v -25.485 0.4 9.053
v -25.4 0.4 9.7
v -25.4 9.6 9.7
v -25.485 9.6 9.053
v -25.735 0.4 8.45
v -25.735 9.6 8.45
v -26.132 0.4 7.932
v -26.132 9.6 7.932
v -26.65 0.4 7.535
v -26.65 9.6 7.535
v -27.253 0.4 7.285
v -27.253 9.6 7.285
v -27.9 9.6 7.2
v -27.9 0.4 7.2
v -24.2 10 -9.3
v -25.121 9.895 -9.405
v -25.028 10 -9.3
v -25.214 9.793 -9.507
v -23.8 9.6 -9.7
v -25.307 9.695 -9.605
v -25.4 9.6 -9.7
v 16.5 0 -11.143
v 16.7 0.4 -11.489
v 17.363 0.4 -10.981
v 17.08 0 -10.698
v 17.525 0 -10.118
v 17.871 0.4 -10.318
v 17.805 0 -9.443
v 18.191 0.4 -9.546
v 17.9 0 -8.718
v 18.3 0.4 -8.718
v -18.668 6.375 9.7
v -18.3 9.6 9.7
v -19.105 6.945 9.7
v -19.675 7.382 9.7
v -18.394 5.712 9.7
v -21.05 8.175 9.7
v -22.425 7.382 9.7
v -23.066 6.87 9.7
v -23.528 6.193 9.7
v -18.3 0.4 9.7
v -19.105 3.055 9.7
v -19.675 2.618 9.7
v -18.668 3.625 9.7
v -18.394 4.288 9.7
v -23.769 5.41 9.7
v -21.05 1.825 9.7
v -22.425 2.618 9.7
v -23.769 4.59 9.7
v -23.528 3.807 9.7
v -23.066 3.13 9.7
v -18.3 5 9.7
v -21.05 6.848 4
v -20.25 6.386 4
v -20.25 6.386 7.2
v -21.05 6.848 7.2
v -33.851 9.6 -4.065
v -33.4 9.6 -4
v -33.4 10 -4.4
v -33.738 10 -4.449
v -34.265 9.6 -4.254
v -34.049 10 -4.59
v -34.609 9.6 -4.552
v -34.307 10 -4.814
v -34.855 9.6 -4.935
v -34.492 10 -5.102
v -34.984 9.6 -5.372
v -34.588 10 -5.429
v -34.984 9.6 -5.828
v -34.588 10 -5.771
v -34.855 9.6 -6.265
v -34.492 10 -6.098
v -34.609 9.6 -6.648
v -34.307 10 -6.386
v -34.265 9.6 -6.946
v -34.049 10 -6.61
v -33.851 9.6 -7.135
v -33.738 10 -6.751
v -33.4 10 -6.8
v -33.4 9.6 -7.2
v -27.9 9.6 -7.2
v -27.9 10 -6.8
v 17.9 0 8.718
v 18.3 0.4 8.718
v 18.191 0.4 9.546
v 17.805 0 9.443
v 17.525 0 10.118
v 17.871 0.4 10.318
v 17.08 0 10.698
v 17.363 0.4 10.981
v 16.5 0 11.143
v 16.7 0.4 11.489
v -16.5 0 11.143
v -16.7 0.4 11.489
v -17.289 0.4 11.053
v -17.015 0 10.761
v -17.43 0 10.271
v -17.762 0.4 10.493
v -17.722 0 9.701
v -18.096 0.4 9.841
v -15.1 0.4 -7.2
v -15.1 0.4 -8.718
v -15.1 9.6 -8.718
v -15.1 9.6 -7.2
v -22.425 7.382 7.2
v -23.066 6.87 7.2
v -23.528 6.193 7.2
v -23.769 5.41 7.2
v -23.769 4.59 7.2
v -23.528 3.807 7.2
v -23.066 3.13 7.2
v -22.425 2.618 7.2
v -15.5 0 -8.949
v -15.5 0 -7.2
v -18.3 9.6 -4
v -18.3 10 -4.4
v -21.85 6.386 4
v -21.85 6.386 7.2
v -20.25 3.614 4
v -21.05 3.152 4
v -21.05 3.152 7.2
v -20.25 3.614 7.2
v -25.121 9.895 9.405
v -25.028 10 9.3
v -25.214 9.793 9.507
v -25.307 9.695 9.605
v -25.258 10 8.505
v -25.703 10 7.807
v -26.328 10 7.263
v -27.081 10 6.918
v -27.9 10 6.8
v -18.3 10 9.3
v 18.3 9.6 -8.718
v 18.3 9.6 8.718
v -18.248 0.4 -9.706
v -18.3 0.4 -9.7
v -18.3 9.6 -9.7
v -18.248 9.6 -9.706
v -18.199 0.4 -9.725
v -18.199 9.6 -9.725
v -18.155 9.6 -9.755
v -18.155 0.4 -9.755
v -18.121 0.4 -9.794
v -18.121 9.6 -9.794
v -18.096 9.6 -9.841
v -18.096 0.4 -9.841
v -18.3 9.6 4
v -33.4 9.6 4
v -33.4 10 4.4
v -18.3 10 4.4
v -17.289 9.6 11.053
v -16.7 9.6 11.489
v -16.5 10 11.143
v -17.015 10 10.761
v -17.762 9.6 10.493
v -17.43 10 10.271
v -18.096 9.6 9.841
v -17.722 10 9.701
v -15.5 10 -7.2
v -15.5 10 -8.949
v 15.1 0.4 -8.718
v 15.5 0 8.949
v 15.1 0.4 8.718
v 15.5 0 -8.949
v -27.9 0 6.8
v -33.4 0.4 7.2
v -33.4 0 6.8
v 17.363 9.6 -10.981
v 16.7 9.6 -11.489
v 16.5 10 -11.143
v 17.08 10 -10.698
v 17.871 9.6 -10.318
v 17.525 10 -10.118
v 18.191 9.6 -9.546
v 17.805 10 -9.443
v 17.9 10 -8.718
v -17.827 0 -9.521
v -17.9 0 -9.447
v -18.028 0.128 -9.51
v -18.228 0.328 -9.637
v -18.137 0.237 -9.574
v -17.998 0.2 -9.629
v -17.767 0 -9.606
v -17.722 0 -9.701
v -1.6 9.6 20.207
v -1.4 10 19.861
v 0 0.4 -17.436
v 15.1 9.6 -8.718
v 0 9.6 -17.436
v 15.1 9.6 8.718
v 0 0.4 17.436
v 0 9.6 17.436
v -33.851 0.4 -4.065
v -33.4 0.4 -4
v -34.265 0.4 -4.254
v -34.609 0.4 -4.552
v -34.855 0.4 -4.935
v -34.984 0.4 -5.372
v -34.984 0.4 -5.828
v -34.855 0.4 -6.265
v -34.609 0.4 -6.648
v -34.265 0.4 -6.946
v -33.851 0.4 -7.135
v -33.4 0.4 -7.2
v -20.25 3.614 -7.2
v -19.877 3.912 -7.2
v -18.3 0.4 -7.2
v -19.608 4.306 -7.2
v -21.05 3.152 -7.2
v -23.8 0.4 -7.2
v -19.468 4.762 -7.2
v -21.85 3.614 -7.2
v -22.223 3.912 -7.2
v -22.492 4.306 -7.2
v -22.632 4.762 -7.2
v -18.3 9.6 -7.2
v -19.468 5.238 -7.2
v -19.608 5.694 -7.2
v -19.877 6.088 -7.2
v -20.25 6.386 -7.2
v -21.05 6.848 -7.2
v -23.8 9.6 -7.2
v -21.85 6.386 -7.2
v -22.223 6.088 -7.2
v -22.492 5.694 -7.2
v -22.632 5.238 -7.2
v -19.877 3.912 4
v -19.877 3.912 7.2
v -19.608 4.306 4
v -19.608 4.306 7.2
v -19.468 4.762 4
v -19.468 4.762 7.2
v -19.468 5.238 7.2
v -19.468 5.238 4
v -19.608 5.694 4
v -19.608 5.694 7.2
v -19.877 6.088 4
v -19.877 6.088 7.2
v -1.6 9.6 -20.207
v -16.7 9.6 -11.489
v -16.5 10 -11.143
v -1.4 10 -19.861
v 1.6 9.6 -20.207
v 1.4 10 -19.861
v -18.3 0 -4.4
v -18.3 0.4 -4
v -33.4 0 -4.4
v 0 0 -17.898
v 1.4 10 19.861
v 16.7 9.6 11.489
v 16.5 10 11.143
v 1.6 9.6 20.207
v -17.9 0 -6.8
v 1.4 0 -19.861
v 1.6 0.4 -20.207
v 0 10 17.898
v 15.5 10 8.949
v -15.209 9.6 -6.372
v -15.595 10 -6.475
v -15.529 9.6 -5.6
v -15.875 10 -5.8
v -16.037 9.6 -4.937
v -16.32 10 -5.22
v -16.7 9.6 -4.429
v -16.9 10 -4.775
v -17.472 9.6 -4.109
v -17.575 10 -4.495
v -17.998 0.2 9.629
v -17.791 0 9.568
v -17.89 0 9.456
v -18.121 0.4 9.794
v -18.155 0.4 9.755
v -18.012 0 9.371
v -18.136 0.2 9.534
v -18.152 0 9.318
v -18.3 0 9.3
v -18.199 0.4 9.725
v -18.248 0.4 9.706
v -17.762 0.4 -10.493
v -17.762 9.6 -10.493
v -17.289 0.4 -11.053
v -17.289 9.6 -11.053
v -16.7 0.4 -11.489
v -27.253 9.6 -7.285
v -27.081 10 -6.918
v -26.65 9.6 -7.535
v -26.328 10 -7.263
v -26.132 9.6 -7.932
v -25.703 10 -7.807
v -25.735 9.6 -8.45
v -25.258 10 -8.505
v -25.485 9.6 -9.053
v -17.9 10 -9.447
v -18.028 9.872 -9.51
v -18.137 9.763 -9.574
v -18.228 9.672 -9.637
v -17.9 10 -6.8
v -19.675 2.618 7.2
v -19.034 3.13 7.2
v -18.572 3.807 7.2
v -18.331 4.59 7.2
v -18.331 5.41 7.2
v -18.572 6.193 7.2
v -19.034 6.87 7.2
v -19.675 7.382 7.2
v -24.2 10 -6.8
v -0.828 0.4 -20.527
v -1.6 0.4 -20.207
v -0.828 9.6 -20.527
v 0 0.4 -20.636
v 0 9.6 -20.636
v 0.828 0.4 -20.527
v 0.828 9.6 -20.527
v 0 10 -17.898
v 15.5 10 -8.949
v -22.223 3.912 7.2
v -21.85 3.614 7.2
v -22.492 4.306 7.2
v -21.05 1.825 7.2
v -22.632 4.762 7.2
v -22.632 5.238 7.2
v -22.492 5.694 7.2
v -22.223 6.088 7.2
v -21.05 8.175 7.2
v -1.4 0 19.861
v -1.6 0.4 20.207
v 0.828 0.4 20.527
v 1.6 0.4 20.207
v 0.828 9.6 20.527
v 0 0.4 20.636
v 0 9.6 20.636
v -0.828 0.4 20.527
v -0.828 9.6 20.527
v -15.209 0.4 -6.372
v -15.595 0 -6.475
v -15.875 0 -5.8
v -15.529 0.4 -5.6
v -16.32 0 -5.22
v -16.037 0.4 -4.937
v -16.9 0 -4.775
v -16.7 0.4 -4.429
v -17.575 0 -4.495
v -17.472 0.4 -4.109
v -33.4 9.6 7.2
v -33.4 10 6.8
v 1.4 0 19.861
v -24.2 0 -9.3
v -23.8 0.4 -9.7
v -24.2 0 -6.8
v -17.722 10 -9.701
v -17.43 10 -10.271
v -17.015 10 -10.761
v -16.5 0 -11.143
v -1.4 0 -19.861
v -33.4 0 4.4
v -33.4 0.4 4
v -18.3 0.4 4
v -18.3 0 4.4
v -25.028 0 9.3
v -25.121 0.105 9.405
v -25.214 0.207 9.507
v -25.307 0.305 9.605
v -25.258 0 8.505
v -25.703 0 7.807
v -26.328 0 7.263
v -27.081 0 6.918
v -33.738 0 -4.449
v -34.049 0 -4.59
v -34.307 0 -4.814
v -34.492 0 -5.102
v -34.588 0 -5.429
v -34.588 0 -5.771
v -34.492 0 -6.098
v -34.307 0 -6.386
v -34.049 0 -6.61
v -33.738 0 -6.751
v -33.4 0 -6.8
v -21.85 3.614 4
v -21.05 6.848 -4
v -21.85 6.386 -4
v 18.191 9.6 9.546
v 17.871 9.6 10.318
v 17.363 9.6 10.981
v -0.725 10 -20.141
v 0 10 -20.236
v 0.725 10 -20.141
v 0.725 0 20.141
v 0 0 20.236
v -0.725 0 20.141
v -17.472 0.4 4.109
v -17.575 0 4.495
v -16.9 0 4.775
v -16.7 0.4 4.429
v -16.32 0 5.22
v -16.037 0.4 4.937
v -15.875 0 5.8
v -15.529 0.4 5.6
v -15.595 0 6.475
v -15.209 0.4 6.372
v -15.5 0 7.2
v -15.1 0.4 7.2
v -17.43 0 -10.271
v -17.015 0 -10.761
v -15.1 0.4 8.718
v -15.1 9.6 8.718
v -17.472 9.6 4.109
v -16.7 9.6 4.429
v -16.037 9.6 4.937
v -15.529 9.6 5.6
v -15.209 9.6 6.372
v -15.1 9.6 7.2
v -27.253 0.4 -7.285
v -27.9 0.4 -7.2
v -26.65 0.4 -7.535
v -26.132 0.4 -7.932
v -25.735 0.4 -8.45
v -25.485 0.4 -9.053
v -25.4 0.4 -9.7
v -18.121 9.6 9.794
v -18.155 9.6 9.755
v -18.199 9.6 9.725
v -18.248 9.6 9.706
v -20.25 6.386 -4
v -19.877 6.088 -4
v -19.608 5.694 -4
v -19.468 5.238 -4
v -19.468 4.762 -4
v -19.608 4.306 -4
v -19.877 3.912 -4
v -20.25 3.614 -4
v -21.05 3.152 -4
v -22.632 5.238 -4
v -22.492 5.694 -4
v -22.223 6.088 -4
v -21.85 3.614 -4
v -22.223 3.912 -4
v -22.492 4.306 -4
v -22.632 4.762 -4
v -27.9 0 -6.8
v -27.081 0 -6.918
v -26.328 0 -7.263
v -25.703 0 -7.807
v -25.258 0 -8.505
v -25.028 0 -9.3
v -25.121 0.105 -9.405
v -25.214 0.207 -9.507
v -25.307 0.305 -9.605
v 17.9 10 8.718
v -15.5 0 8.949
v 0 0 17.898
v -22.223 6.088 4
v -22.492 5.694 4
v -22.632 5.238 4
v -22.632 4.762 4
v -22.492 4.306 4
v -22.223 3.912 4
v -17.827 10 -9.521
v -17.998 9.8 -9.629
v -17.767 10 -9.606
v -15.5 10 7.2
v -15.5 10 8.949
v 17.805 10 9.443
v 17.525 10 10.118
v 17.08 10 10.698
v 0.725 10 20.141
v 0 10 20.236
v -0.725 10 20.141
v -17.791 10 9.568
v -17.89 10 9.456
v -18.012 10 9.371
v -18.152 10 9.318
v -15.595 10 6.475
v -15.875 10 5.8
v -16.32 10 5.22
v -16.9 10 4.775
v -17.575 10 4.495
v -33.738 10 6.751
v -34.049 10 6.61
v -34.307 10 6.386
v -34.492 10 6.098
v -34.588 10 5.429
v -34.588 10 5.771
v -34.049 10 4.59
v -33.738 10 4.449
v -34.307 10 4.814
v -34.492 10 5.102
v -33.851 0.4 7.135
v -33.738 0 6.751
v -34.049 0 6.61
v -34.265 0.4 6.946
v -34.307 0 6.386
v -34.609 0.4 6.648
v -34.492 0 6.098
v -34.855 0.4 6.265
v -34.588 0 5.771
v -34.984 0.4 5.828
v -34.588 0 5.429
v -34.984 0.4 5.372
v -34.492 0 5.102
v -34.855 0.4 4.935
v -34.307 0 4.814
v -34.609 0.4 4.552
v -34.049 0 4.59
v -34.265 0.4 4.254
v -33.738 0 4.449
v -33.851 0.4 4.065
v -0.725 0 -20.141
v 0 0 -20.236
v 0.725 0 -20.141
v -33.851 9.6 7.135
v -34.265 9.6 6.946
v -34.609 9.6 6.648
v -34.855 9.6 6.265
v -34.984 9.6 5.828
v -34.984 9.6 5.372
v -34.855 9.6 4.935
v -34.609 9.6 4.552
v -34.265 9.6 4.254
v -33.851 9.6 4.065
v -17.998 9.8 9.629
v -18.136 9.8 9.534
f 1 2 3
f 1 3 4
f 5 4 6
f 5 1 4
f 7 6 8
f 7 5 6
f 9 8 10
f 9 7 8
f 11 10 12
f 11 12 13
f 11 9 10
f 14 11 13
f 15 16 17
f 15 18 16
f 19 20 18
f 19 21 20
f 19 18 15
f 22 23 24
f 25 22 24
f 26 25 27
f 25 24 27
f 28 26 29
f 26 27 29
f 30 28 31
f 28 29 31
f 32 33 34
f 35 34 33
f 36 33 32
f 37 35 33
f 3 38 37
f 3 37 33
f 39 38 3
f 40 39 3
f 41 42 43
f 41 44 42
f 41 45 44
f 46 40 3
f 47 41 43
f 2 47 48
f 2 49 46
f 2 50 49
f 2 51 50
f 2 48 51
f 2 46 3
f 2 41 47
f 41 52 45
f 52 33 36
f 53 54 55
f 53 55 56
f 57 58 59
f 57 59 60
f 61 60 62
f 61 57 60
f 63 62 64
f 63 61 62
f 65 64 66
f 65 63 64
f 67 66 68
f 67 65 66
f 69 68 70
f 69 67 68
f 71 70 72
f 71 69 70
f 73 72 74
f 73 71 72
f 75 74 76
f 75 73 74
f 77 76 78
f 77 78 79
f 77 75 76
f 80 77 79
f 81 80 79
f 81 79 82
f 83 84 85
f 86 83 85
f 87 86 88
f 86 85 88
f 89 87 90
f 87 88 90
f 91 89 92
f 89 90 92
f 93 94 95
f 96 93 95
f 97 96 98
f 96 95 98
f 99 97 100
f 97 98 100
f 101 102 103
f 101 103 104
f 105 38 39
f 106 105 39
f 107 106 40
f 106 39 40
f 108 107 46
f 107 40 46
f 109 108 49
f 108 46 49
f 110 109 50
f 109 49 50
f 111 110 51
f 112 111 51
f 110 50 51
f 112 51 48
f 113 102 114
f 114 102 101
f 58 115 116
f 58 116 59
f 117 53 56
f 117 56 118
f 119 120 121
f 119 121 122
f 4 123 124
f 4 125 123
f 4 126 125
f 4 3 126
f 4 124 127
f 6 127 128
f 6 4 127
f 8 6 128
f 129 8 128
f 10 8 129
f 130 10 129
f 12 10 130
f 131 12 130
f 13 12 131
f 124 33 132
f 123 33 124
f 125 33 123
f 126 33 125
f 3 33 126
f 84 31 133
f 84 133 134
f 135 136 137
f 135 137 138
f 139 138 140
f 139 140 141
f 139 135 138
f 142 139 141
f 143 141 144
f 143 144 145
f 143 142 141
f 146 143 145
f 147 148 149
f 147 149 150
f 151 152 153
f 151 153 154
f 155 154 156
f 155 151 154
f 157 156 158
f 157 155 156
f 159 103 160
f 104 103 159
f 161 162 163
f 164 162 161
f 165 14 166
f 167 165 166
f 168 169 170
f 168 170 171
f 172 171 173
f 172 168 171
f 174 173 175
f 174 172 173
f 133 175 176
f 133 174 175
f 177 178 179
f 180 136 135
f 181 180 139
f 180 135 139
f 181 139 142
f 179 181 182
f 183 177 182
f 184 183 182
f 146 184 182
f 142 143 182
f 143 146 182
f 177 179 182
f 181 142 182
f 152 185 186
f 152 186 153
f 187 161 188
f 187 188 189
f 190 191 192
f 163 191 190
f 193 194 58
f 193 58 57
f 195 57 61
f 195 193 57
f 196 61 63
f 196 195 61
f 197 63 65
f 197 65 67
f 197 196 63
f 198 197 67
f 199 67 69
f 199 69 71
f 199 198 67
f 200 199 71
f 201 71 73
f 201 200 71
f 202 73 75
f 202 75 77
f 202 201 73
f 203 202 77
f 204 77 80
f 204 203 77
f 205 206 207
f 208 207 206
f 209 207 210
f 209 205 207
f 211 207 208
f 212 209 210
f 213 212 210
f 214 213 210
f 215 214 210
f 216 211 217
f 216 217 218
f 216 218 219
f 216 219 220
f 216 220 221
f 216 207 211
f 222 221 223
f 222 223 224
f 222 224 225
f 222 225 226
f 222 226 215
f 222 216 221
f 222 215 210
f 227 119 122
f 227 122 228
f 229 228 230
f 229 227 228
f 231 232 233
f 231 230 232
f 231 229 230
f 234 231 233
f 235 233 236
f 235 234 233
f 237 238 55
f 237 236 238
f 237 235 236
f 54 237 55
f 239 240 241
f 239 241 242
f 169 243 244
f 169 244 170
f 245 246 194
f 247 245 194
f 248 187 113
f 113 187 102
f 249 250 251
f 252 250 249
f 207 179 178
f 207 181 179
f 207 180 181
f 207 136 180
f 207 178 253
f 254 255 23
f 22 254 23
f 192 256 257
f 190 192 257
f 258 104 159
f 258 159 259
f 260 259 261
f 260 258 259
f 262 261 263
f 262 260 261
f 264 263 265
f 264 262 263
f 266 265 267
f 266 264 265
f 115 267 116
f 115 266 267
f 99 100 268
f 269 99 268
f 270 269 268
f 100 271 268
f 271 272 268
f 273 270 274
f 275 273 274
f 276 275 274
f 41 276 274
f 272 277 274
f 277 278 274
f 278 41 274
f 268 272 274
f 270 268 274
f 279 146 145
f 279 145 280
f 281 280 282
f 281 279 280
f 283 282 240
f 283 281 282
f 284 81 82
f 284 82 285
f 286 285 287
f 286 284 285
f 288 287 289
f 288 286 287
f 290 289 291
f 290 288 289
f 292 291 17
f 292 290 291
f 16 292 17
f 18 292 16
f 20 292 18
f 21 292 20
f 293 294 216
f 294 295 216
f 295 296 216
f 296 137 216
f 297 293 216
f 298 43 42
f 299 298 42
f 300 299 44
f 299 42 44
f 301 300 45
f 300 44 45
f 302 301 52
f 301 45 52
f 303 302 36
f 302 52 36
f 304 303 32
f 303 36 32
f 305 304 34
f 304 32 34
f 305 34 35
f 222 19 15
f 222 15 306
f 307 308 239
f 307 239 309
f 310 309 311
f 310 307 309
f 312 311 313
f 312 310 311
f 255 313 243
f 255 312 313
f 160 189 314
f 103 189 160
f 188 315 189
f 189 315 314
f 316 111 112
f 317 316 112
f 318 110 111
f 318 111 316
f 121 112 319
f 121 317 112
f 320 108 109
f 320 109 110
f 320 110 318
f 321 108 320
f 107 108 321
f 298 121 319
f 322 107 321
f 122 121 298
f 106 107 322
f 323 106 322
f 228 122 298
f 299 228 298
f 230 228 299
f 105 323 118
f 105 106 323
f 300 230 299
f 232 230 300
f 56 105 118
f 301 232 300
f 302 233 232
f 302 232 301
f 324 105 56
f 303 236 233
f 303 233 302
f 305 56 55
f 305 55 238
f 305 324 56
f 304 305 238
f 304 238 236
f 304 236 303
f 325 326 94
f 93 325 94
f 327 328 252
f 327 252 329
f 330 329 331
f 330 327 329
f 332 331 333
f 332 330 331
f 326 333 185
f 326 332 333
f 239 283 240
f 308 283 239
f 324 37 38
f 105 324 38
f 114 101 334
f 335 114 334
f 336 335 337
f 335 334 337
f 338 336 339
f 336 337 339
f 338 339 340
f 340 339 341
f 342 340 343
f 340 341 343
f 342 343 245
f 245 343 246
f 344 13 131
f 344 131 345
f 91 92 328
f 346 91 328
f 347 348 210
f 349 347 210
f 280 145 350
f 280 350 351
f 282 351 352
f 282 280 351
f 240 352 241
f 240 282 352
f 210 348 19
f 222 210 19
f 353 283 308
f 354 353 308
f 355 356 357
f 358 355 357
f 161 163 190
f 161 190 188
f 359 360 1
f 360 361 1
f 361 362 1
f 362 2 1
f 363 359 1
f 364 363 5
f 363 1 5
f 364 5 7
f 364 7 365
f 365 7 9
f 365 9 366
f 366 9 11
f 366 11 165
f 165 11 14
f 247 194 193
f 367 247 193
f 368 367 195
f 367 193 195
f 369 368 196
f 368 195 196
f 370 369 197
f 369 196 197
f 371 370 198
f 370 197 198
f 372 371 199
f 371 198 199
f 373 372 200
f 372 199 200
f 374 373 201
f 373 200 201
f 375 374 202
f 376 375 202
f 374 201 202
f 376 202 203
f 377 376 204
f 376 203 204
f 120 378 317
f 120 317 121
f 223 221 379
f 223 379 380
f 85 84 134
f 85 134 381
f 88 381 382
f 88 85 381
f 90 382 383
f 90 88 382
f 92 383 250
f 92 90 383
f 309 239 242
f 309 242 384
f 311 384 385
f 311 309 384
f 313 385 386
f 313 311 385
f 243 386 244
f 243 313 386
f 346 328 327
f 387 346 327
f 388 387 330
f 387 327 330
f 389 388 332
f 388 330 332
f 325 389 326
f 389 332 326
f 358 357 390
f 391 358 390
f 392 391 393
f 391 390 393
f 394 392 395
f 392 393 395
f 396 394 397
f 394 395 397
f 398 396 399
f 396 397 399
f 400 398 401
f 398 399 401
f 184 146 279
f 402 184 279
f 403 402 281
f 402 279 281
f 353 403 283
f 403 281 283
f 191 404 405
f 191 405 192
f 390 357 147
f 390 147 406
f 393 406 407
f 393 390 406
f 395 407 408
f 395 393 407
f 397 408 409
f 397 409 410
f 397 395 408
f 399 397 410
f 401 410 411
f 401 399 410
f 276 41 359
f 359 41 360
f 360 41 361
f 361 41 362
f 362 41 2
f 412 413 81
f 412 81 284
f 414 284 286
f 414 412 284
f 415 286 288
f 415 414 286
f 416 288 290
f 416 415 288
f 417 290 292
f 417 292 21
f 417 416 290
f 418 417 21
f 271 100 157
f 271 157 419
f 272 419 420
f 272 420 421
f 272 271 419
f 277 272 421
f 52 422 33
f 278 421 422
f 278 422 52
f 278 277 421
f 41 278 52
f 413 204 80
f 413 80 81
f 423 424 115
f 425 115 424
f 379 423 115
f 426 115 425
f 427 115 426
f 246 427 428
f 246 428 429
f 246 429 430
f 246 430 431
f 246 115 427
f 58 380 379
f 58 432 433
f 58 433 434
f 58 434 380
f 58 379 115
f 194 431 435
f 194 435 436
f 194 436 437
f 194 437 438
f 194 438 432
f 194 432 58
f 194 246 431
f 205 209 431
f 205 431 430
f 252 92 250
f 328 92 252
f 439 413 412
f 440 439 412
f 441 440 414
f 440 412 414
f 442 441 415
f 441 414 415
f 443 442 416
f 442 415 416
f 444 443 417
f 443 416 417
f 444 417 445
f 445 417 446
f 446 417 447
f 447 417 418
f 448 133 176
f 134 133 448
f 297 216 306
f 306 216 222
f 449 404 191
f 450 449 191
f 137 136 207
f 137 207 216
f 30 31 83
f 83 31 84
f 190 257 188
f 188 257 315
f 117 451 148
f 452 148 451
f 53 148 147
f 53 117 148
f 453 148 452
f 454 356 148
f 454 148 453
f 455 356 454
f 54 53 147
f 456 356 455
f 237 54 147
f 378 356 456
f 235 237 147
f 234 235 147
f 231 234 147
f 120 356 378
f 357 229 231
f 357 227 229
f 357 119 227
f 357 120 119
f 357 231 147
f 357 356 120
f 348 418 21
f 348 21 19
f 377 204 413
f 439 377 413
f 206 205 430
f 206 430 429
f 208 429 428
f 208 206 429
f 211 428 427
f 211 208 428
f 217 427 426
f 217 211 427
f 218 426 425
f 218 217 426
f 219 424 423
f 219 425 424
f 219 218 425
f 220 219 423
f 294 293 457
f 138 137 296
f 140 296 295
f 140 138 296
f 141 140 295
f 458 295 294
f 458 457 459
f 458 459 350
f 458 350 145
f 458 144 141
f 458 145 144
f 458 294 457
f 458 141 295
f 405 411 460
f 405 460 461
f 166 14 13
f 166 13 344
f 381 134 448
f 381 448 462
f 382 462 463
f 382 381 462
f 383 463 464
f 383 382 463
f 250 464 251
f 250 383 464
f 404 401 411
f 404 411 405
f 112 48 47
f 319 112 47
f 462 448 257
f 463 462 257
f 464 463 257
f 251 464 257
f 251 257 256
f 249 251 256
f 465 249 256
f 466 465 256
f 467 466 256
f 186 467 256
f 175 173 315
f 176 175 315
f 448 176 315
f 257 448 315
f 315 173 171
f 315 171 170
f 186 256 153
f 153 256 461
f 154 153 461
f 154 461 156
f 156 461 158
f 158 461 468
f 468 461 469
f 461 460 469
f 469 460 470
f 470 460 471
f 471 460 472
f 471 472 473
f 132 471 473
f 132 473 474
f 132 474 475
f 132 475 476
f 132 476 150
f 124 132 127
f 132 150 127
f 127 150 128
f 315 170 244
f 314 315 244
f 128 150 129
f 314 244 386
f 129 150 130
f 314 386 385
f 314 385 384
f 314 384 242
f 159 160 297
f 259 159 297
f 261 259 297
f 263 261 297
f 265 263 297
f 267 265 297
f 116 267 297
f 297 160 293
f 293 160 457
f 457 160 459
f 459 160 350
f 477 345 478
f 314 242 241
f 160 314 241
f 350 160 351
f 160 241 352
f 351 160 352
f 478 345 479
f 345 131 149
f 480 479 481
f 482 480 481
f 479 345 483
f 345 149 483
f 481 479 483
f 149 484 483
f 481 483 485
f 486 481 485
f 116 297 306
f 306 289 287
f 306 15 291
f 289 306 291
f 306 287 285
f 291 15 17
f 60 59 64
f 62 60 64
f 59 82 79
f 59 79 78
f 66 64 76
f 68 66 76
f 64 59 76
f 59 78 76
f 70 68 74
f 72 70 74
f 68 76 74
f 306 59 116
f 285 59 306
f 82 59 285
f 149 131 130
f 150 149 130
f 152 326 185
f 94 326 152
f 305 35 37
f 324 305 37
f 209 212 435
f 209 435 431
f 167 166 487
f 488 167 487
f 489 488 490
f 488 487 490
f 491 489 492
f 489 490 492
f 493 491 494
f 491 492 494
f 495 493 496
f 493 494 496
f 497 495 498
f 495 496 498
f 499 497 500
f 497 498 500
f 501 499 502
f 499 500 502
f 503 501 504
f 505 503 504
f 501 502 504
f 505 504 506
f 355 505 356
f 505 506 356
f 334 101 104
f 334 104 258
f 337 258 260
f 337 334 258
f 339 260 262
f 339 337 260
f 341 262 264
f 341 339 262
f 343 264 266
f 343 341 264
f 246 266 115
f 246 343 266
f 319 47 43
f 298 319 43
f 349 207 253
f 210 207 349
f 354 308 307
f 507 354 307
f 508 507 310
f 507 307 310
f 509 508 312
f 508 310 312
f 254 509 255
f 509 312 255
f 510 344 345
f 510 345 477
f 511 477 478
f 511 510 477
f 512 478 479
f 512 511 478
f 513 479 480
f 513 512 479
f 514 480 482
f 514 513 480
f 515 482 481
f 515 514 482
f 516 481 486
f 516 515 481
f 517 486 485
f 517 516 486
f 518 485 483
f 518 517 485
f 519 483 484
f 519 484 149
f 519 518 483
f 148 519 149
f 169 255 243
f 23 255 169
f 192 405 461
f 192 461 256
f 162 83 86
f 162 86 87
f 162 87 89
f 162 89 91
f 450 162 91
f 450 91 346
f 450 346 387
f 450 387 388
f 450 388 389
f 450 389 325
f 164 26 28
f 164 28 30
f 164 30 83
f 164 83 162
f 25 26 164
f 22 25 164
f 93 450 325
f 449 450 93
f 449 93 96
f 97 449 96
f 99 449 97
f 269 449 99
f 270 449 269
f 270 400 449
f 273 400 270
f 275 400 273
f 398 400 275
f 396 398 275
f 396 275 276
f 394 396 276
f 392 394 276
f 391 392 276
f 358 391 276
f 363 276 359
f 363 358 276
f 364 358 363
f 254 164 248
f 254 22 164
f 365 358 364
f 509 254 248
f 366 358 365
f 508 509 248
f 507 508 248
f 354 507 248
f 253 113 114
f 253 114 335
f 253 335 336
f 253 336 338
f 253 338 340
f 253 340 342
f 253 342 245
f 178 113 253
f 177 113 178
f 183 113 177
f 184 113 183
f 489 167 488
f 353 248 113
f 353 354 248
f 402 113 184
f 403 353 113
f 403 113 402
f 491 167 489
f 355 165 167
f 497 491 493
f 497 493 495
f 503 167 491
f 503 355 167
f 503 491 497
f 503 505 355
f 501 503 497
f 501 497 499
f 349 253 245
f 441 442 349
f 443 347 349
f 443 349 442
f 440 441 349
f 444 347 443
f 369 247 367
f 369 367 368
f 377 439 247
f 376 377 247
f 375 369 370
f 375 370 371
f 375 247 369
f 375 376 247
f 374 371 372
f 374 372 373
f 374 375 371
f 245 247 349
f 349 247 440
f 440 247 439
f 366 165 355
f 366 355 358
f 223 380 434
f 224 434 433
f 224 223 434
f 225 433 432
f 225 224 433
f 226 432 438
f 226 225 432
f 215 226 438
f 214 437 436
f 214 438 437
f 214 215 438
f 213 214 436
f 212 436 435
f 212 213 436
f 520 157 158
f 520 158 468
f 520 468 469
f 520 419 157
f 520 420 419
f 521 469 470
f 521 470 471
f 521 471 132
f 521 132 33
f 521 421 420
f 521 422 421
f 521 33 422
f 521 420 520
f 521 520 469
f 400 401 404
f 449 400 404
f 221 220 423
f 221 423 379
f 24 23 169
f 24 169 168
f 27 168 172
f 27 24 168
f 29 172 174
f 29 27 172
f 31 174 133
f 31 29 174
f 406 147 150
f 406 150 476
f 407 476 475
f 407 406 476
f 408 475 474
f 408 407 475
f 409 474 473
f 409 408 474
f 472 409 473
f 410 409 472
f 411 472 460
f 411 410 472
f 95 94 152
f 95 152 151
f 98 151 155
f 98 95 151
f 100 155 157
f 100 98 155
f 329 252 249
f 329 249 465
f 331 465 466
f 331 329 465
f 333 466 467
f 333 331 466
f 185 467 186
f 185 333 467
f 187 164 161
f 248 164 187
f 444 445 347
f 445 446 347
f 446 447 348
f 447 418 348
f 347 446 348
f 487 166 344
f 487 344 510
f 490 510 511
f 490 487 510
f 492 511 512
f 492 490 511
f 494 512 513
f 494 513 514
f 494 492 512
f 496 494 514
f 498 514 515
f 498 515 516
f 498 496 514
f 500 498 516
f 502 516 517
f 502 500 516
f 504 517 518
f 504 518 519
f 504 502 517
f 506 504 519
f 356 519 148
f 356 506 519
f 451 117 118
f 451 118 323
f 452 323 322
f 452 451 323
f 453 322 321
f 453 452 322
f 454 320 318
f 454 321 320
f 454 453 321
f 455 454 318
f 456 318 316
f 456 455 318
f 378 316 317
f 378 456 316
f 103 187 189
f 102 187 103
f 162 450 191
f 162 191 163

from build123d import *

# Parameters (mm, degrees)
BOSS_EXTRUDE1_DEPTH = 10
SKETCH3_W           = 5.5
SKETCH3_H           = 10
CUT_EXTRUDE1_DEPTH  = 2.5
CUT_EXTRUDE2_DEPTH  = 28.83597813
CUT_EXTRUDE3_DEPTH  = 2.5
CHAMFER1_SIZE       = 0.4


with BuildPart() as part:
    # Sketch1 → Boss-Extrude1 (new body)
    with BuildSketch(Plane(origin=(0, 0, 0), x_dir=(1, 0, 0), z_dir=(0, 1, 0))):
        with BuildLine():
            Line((15.1, -8.717989065), (15.1, 8.717989065))
            Line((15.1, 8.717989065), (0, 17.43597813))
            Line((0, 17.43597813), (-15.1, 8.717989065))
            Line((-15.1, 8.717989065), (-15.1, 7.2))
            ThreePointArc((-15.1, 7.2), (-16.0372583, 4.9372583), (-18.3, 4))
            Line((-18.3, 4), (-33.4, 4))
            ThreePointArc((-33.4, 4), (-35, 5.6), (-33.4, 7.2))
            Line((-33.4, 7.2), (-27.9, 7.2))
            ThreePointArc((-27.9, 7.2), (-26.132233047, 7.932233047), (-25.4, 9.7))
            Line((-25.4, 9.7), (-18.3, 9.7))
            ThreePointArc((-18.3, 9.7), (-18.176160108, 9.73872205), (-18.096437184, 9.841093781))
            ThreePointArc((-18.096437184, 9.841093781), (-17.541501628, 10.786580324), (-16.7, 11.489270357))
            Line((-16.7, 11.489270357), (-1.6, 20.207259422))
            ThreePointArc((-1.6, 20.207259422), (0, 20.63597813), (1.6, 20.207259422))
            Line((1.6, 20.207259422), (16.7, 11.489270357))
            ThreePointArc((16.7, 11.489270357), (17.871281292, 10.317989065), (18.3, 8.717989065))
            Line((18.3, 8.717989065), (18.3, -8.717989065))
            ThreePointArc((18.3, -8.717989065), (17.871281292, -10.317989065), (16.7, -11.489270357))
            Line((16.7, -11.489270357), (1.6, -20.207259422))
            ThreePointArc((1.6, -20.207259422), (0, -20.63597813), (-1.6, -20.207259422))
            Line((-1.6, -20.207259422), (-16.7, -11.489270357))
            ThreePointArc((-16.7, -11.489270357), (-17.541501628, -10.786580324), (-18.096437184, -9.841093781))
            ThreePointArc((-18.096437184, -9.841093781), (-18.176160108, -9.73872205), (-18.3, -9.7))
            Line((-18.3, -9.7), (-25.4, -9.7))
            ThreePointArc((-25.4, -9.7), (-26.132233047, -7.932233047), (-27.9, -7.2))
            Line((-27.9, -7.2), (-33.4, -7.2))
            ThreePointArc((-33.4, -7.2), (-35, -5.6), (-33.4, -4))
            Line((-33.4, -4), (-18.3, -4))
            ThreePointArc((-18.3, -4), (-16.0372583, -4.9372583), (-15.1, -7.2))
            Line((-15.1, -7.2), (-15.1, -8.717989065))
            Line((-15.1, -8.717989065), (0, -17.43597813))
            Line((0, -17.43597813), (15.1, -8.717989065))
        make_face()
    extrude(amount=BOSS_EXTRUDE1_DEPTH)

    # Sketch3 → Cut-Extrude1 (cut)
    with BuildSketch(Plane(origin=(0, 0, -9.7), x_dir=(-1, 0, 0), z_dir=(0, 0, -1))):
        with Locations((21.05, 5)):
            Rectangle(SKETCH3_W, SKETCH3_H)
    extrude(amount=-CUT_EXTRUDE1_DEPTH, mode=Mode.SUBTRACT)

    # Sketch4 → Cut-Extrude2 (cut, through all)
    with BuildSketch(Plane(origin=(0, 0, -7.2), x_dir=(-1, 0, 0), z_dir=(0, 0, -1))):
        with BuildLine():
            Line((20.25, 6.385640646), (21.05, 6.847520861))
            Line((21.05, 6.847520861), (21.85, 6.385640646))
            ThreePointArc((21.85, 6.385640646), (22.65, 5), (21.85, 3.614359354))
            Line((21.85, 3.614359354), (21.05, 3.152479139))
            Line((21.05, 3.152479139), (20.25, 3.614359354))
            ThreePointArc((20.25, 3.614359354), (19.45, 5), (20.25, 6.385640646))
        make_face()
    extrude(amount=-CUT_EXTRUDE2_DEPTH, mode=Mode.SUBTRACT)

    # Sketch5 → Cut-Extrude3 (cut)
    with BuildSketch(Plane.XY.offset(9.7)):
        with BuildLine():
            Line((-22.425, 2.61843014), (-21.05, 1.824573519))
            Line((-21.05, 1.824573519), (-19.675, 2.61843014))
            ThreePointArc((-19.675, 2.61843014), (-18.3, 5), (-19.675, 7.38156986))
            Line((-19.675, 7.38156986), (-21.05, 8.175426481))
            Line((-21.05, 8.175426481), (-22.425, 7.38156986))
            ThreePointArc((-22.425, 7.38156986), (-23.8, 5), (-22.425, 2.61843014))
        make_face()
    extrude(amount=-CUT_EXTRUDE3_DEPTH, mode=Mode.SUBTRACT)

    # Chamfer1
    chamfer1_edges = [part.edges().sort_by_distance(p)[0] for p in [
        (-30.65, 10, -7.2),
        (-35, 10, -5.6),
        (-25.85, 10, -4),
        (-16.0372583, 10, -4.9372583),
        (-15.1, 10, -7.958994532),
        (-7.55, 10, -13.076983597),
        (7.55, 10, -13.076983597),
        (15.1, 10, 0),
        (-15.1, 10, 7.958994532),
        (-16.0372583, 10, 4.9372583),
        (-25.85, 10, 4),
        (-35, 10, 5.6),
        (-30.65, 10, 7.2),
        (15.1, 0, 0),
        (7.55, 0, -13.076983597),
        (-7.55, 0, -13.076983597),
        (-15.1, 0, -7.958994532),
        (-16.0372583, 0, -4.9372583),
        (-25.85, 0, -4),
        (-35, 0, -5.6),
        (-26.132233047, 10, 7.932233047),
        (-30.65, 0, -7.2),
        (-26.132233047, 0, -7.932233047),
        (-18.176160108, 0, -9.73872205),
        (-17.541501628, 0, -10.786580324),
        (-9.15, 0, -15.848264889),
        (0, 0, -20.63597813),
        (9.15, 0, -15.848264889),
        (17.871281292, 0, -10.317989065),
        (18.3, 0, 0),
        (-21.85, 10, 9.7),
        (17.871281292, 0, 10.317989065),
        (9.15, 0, 15.848264889),
        (0, 0, 20.63597813),
        (-9.15, 0, 15.848264889),
        (-17.541501628, 0, 10.786580324),
        (-18.176160108, 0, 9.73872205),
        (-21.85, 0, 9.7),
        (-26.132233047, 0, 7.932233047),
        (-30.65, 0, 7.2),
        (-35, 0, 5.6),
        (-18.176160108, 10, 9.73872205),
        (-25.85, 0, 4),
        (-16.0372583, 0, 4.9372583),
        (-15.1, 0, 7.958994532),
        (-7.55, 0, 13.076983597),
        (7.55, 0, 13.076983597),
        (-17.541501628, 10, 10.786580324),
        (-9.15, 10, 15.848264889),
        (7.55, 10, 13.076983597),
        (0, 10, 20.63597813),
        (9.15, 10, 15.848264889),
        (17.871281292, 10, 10.317989065),
        (18.3, 10, 0),
        (17.871281292, 10, -10.317989065),
        (9.15, 10, -15.848264889),
        (0, 10, -20.63597813),
        (-9.15, 10, -15.848264889),
        (-17.541501628, 10, -10.786580324),
        (-18.176160108, 10, -9.73872205),
        (-7.55, 10, 13.076983597),
        (-24.6, 0, -9.7),
        (-24.6, 10, -9.7),
        (-18.3, 0, -8.45),
        (-21.05, 10, -7.2),
        (-18.3, 10, -8.45),
        (-23.8, 10, -8.45),
        (-21.05, 0, -7.2),
        (-23.8, 0, -8.45),
        (-26.132233047, 10, -7.932233047),
    ]]
    chamfer(chamfer1_edges, length=CHAMFER1_SIZE)


solid = part.part
